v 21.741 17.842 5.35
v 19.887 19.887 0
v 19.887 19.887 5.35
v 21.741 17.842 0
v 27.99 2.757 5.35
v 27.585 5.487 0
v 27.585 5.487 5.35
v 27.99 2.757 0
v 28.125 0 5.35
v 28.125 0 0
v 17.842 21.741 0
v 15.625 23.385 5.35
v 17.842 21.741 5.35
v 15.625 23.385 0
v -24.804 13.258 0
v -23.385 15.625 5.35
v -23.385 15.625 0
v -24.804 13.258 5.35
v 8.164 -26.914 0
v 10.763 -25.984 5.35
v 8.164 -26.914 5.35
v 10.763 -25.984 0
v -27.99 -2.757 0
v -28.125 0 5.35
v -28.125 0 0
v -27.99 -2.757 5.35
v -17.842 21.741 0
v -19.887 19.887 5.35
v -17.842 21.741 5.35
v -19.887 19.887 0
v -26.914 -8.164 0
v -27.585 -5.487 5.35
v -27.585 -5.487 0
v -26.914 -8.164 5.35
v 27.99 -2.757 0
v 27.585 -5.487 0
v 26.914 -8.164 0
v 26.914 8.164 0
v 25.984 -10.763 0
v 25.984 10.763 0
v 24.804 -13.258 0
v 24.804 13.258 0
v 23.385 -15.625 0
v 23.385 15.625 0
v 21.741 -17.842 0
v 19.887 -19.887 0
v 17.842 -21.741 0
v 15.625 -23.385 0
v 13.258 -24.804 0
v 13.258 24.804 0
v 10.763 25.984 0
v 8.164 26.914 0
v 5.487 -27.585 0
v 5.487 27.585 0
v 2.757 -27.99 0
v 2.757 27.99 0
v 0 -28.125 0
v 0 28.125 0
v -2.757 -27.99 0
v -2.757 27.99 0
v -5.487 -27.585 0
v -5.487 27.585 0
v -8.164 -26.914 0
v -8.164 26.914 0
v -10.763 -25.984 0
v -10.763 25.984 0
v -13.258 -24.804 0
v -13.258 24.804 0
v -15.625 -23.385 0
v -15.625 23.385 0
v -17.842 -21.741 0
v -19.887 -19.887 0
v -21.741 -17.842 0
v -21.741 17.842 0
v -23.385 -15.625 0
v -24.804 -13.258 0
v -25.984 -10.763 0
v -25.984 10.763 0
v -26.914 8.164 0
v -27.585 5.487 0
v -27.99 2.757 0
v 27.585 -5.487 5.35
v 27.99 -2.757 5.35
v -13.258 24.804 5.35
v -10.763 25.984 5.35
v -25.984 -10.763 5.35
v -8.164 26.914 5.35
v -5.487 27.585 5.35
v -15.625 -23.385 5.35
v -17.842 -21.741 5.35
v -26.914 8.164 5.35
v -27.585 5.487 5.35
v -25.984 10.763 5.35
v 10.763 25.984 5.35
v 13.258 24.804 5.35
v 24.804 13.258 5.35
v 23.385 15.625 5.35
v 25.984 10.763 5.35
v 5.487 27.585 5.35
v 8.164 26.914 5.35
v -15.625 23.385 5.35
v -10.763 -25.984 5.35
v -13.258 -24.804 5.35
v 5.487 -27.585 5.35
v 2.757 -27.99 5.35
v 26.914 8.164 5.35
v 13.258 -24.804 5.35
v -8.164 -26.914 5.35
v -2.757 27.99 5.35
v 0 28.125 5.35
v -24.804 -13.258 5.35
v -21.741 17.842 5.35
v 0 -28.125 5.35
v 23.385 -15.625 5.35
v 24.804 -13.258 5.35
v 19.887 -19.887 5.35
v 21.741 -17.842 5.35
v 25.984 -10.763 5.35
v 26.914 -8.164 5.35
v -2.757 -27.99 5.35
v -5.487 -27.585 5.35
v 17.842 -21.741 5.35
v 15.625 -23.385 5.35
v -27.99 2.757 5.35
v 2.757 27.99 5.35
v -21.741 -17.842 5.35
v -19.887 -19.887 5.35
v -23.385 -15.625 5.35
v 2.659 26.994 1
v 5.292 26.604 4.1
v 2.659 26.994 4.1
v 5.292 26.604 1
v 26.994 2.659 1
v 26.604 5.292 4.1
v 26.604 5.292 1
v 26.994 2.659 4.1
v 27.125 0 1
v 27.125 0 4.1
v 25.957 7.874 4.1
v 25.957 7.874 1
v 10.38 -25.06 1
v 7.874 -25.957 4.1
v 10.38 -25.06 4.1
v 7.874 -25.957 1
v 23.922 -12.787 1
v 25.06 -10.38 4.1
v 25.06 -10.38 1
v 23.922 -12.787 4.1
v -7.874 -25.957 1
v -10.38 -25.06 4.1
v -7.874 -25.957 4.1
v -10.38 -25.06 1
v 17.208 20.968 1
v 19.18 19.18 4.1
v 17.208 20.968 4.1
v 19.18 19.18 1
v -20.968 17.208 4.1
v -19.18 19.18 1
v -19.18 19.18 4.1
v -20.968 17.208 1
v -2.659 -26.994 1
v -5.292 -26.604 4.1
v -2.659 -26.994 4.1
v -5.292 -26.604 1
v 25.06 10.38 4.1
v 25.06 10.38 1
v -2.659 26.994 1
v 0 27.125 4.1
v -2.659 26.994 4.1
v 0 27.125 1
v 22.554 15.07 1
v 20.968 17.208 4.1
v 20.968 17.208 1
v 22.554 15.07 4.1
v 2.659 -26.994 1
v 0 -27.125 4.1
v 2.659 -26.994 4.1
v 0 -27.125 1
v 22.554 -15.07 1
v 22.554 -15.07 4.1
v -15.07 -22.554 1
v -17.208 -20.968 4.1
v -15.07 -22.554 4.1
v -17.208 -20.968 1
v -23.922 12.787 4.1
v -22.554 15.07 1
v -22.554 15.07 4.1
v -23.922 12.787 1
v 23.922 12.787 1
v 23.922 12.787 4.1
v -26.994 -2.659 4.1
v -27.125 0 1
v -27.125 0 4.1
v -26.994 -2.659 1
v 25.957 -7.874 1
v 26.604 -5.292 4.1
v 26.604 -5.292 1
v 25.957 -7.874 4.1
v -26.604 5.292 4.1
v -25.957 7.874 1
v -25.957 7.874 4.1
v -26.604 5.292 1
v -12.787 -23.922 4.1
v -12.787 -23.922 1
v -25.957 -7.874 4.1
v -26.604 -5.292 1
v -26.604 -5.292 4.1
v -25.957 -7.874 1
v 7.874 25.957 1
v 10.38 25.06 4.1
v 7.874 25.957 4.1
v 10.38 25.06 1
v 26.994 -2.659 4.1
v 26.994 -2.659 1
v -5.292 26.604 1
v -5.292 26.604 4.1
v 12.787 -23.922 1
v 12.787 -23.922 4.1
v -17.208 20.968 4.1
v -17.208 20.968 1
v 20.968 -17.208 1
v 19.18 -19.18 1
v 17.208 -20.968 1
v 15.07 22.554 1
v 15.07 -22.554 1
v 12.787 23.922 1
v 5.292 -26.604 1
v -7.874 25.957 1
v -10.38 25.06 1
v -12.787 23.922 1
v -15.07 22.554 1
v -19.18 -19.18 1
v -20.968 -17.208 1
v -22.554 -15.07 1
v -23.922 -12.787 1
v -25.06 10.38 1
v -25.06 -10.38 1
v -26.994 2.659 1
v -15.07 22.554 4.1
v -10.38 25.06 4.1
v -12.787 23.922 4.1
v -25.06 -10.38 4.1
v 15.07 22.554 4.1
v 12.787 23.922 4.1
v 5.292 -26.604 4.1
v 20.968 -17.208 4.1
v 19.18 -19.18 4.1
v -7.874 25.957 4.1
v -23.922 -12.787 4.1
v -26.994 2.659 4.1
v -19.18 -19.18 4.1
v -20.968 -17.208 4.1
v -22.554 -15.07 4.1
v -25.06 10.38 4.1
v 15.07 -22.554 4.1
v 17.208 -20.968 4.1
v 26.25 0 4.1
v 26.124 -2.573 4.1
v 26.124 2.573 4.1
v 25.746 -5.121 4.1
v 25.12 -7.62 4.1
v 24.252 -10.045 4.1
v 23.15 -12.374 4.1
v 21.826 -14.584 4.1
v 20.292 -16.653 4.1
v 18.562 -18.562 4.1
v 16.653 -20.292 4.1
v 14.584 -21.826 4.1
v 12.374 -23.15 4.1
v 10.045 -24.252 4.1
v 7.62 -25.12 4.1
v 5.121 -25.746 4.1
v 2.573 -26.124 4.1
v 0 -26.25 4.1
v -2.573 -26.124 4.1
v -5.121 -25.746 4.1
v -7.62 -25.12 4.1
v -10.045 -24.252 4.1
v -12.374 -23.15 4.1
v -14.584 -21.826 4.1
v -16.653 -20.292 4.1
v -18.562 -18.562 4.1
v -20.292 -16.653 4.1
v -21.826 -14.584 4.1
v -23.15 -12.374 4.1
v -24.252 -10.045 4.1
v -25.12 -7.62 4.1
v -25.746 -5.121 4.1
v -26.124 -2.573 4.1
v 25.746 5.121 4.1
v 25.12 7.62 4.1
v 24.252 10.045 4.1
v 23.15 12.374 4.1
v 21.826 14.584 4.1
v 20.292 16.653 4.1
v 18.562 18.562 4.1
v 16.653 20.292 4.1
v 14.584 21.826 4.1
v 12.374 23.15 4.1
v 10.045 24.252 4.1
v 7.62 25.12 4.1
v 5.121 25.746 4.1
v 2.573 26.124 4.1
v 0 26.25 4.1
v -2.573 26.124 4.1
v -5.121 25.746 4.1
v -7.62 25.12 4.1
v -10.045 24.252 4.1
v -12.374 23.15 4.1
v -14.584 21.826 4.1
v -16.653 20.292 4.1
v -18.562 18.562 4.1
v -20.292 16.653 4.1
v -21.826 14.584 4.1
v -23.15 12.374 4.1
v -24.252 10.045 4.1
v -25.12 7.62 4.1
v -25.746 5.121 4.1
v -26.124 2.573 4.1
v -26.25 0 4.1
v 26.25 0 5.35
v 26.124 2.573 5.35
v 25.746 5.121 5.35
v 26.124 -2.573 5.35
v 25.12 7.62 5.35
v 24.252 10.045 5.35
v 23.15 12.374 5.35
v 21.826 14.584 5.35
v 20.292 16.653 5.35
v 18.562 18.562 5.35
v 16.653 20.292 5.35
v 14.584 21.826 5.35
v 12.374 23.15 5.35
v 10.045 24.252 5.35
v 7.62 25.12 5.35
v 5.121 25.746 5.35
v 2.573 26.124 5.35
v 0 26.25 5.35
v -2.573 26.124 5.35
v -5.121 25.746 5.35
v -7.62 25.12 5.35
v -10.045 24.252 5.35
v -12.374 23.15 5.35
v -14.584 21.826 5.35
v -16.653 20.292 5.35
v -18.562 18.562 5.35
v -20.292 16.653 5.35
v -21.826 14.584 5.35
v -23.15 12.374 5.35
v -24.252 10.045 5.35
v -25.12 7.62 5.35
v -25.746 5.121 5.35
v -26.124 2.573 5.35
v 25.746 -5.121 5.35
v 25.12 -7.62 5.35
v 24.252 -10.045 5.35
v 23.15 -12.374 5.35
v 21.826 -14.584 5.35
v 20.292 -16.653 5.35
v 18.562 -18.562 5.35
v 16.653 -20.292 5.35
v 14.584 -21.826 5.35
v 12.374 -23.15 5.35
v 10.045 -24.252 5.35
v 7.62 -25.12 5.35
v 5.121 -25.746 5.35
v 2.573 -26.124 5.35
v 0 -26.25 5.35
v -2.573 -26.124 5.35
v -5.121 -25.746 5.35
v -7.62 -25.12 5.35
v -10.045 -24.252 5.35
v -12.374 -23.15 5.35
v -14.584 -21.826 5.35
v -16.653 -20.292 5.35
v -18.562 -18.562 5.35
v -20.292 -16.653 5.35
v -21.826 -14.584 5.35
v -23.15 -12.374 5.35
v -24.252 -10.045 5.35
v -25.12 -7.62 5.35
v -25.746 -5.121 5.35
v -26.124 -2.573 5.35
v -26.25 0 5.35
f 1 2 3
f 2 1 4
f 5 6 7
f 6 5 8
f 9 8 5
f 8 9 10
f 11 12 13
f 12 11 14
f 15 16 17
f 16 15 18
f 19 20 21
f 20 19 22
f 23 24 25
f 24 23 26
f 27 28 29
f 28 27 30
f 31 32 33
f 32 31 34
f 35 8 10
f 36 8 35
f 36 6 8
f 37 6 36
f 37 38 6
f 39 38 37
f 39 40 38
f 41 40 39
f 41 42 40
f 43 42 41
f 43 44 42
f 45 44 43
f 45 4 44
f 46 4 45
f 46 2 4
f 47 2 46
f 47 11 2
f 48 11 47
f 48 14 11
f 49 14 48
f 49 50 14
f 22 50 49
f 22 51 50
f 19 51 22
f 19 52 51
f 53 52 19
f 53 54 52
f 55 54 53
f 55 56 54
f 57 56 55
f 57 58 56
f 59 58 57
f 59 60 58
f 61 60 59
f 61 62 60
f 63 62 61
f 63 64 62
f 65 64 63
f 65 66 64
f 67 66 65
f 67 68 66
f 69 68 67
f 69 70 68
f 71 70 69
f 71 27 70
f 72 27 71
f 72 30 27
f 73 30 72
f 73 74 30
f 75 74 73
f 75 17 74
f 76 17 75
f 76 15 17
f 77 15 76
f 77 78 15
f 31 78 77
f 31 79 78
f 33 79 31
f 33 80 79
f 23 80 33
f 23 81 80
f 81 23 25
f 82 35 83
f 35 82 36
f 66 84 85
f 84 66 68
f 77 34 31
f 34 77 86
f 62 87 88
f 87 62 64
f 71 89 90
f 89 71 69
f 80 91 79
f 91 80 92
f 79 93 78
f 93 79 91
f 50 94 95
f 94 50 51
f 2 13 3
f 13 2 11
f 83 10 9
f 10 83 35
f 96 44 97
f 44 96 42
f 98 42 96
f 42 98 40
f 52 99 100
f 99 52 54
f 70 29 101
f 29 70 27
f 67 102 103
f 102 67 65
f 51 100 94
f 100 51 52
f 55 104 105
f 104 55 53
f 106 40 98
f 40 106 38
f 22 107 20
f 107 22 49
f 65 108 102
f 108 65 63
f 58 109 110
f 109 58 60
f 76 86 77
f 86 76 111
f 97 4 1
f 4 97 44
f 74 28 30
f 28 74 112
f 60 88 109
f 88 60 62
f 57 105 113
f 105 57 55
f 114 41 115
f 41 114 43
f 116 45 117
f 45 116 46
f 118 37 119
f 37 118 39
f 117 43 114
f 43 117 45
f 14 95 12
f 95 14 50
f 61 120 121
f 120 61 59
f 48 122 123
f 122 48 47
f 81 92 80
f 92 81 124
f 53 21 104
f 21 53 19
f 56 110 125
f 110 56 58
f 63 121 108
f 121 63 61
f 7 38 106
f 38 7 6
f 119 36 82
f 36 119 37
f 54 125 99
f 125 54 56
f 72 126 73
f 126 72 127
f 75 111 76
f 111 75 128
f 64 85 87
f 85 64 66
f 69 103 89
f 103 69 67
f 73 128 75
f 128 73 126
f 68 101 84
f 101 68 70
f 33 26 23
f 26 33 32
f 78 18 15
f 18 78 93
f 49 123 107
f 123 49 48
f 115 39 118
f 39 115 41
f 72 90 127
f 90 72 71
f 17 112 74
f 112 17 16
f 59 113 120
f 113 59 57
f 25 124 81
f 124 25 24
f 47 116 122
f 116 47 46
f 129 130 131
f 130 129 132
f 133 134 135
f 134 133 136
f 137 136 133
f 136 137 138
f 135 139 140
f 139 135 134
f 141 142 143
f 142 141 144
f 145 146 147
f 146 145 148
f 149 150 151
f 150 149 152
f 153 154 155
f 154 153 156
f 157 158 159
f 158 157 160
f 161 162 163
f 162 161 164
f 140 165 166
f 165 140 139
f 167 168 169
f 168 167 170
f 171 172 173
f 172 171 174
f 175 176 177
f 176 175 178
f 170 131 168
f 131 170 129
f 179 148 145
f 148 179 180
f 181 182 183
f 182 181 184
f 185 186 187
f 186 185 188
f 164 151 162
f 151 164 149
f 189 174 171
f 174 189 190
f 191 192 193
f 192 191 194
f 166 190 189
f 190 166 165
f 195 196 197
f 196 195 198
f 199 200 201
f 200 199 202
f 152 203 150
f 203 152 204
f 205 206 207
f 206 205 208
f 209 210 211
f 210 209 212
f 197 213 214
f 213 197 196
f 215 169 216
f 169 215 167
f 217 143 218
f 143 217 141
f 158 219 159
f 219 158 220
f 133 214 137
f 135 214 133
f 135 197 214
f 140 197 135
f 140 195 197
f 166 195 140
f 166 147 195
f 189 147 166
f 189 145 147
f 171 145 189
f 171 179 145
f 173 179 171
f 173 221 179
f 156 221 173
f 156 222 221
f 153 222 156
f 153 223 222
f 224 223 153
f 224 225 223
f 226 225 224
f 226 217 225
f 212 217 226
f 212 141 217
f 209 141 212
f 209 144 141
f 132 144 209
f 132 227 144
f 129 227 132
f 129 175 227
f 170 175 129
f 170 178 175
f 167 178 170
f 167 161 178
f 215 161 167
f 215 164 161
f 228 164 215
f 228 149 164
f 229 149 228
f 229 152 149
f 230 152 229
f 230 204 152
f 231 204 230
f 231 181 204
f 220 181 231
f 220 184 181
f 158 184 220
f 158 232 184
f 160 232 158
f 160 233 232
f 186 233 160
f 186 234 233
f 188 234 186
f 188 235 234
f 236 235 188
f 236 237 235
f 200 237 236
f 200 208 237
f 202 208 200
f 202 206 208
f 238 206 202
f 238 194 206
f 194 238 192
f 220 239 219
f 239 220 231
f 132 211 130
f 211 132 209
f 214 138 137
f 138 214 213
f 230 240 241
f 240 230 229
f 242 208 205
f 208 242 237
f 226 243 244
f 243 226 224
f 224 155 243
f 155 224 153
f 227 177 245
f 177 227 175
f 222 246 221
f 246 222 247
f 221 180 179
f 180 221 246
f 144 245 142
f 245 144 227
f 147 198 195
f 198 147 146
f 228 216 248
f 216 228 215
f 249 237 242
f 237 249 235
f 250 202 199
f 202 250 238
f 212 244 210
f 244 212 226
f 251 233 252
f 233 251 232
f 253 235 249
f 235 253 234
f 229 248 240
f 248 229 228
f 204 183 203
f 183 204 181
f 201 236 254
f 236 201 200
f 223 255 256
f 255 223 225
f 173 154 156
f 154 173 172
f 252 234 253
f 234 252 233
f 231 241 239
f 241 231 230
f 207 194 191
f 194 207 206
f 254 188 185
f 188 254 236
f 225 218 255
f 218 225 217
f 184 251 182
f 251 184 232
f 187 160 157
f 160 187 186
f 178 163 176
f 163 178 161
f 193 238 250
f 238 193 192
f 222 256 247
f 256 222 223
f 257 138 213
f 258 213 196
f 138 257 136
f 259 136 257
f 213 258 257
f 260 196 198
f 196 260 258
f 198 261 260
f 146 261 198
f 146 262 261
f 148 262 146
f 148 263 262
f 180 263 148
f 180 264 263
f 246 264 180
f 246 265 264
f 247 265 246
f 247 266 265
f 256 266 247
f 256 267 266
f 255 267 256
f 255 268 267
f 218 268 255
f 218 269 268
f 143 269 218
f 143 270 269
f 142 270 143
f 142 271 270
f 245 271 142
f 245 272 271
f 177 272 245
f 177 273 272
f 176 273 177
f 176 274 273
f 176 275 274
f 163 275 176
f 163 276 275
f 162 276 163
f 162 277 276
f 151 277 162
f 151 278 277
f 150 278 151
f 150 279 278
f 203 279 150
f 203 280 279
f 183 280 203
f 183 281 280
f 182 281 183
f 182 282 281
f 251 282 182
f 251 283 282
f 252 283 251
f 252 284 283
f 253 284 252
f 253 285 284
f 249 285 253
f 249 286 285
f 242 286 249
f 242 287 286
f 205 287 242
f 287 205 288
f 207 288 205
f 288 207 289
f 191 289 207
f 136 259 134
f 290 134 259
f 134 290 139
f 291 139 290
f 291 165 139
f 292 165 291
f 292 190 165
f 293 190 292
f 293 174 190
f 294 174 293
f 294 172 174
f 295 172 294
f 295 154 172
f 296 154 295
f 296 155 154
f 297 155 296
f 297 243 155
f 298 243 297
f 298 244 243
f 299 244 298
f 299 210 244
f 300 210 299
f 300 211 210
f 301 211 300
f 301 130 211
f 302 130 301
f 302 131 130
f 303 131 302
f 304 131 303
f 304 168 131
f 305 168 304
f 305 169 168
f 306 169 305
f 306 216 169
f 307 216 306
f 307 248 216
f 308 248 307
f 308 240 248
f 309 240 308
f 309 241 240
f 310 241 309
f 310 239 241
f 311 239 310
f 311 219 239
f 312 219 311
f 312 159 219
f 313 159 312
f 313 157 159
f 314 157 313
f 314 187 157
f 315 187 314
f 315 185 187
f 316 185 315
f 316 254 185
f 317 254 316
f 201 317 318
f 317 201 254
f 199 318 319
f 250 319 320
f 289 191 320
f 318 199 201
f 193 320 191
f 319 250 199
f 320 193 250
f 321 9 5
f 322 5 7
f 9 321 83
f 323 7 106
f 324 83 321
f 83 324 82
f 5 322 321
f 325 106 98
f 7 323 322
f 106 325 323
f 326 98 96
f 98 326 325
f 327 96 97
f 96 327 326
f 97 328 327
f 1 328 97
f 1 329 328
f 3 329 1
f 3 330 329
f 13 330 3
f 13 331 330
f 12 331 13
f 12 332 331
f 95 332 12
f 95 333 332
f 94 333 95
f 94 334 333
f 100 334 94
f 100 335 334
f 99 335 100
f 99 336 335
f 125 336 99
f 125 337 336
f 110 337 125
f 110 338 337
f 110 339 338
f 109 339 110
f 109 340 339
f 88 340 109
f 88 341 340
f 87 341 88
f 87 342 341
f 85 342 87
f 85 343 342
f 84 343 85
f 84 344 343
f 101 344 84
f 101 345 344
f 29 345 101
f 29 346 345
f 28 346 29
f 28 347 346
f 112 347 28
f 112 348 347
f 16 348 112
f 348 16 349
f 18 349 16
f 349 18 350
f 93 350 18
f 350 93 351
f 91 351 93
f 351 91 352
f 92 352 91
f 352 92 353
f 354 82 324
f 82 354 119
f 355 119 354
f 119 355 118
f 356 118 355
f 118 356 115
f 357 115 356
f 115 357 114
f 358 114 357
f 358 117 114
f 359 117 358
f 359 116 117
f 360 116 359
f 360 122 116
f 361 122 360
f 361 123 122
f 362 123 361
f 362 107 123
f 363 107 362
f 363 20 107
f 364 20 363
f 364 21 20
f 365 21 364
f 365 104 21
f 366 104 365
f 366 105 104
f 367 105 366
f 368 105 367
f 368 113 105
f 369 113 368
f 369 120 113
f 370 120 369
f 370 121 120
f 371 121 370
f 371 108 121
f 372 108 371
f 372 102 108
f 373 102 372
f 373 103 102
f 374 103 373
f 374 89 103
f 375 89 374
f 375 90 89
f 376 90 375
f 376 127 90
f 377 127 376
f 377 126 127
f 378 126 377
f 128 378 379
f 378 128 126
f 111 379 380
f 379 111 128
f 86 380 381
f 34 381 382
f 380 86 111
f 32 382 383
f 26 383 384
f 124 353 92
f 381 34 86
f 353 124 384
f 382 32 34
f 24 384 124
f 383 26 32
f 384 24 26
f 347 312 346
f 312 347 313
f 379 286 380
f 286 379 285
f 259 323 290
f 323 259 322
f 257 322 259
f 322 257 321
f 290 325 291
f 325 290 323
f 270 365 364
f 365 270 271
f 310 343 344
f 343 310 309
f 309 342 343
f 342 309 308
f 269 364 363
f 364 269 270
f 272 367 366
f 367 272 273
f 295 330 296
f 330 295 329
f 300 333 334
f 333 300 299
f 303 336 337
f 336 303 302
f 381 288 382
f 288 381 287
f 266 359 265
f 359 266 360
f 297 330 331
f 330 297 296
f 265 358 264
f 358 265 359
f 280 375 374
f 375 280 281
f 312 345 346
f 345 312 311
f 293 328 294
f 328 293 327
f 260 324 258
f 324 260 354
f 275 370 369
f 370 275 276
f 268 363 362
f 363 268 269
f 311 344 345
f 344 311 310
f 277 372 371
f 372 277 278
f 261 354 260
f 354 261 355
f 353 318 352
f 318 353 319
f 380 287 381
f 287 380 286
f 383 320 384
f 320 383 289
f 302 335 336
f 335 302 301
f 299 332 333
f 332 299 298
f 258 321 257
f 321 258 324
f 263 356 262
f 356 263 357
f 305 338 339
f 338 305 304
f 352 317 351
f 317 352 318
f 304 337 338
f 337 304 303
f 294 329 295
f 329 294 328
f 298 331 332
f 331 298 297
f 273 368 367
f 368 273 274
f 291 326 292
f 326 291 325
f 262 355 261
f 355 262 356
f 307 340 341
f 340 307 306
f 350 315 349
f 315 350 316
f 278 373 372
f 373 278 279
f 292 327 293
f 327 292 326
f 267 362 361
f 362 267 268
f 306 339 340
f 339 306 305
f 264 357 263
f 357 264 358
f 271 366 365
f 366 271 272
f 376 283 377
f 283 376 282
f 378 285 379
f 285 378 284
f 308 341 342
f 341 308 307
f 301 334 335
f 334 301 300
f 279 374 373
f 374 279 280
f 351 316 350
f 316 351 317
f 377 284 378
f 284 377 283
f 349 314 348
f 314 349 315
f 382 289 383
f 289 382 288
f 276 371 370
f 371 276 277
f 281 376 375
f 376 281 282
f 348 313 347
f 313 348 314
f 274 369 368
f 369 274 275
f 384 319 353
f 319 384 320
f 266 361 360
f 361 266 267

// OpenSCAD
// http://www.thingiverse.com/thing:1513164
// Customisable Can Base


// extra size for a tight fit
extra_size = 1.5; 
 // general thickness
thickness = 1;
// Rim Height
rim_h = 3.10;
// Can Diameter
can_dia = 52.75;
// Groove Diameter
groove_dia = 51.0;
// Groove Height
groove_h = 1.25;

// smoothing
$fn = 64;
// padding for manifold (ignore)
pad = 0.001; 


module lowerbase() {
    o_dia = can_dia + thickness*2 + extra_size;
    o_h = rim_h + thickness + extra_size/2;
    i_dia = can_dia + extra_size;
    i_h = rim_h+thickness*2+pad+ extra_size/2;


    difference() {
        cylinder(d=o_dia, h=o_h);
        translate([0,0,thickness]) cylinder(d=i_dia, h=i_h);
    }
}

module upperbase() {
    o_dia = can_dia + thickness*2 + extra_size;
    o_h = groove_h;
    i_dia = groove_dia + extra_size;
    i_h = groove_h+pad*2;
    
    difference() {
        cylinder(d=o_dia, h=o_h);
        translate([0,0,-pad]) cylinder(d=i_dia, h=i_h);
    }
}

lowerbase();
translate([0,0,rim_h + thickness]) upperbase();
